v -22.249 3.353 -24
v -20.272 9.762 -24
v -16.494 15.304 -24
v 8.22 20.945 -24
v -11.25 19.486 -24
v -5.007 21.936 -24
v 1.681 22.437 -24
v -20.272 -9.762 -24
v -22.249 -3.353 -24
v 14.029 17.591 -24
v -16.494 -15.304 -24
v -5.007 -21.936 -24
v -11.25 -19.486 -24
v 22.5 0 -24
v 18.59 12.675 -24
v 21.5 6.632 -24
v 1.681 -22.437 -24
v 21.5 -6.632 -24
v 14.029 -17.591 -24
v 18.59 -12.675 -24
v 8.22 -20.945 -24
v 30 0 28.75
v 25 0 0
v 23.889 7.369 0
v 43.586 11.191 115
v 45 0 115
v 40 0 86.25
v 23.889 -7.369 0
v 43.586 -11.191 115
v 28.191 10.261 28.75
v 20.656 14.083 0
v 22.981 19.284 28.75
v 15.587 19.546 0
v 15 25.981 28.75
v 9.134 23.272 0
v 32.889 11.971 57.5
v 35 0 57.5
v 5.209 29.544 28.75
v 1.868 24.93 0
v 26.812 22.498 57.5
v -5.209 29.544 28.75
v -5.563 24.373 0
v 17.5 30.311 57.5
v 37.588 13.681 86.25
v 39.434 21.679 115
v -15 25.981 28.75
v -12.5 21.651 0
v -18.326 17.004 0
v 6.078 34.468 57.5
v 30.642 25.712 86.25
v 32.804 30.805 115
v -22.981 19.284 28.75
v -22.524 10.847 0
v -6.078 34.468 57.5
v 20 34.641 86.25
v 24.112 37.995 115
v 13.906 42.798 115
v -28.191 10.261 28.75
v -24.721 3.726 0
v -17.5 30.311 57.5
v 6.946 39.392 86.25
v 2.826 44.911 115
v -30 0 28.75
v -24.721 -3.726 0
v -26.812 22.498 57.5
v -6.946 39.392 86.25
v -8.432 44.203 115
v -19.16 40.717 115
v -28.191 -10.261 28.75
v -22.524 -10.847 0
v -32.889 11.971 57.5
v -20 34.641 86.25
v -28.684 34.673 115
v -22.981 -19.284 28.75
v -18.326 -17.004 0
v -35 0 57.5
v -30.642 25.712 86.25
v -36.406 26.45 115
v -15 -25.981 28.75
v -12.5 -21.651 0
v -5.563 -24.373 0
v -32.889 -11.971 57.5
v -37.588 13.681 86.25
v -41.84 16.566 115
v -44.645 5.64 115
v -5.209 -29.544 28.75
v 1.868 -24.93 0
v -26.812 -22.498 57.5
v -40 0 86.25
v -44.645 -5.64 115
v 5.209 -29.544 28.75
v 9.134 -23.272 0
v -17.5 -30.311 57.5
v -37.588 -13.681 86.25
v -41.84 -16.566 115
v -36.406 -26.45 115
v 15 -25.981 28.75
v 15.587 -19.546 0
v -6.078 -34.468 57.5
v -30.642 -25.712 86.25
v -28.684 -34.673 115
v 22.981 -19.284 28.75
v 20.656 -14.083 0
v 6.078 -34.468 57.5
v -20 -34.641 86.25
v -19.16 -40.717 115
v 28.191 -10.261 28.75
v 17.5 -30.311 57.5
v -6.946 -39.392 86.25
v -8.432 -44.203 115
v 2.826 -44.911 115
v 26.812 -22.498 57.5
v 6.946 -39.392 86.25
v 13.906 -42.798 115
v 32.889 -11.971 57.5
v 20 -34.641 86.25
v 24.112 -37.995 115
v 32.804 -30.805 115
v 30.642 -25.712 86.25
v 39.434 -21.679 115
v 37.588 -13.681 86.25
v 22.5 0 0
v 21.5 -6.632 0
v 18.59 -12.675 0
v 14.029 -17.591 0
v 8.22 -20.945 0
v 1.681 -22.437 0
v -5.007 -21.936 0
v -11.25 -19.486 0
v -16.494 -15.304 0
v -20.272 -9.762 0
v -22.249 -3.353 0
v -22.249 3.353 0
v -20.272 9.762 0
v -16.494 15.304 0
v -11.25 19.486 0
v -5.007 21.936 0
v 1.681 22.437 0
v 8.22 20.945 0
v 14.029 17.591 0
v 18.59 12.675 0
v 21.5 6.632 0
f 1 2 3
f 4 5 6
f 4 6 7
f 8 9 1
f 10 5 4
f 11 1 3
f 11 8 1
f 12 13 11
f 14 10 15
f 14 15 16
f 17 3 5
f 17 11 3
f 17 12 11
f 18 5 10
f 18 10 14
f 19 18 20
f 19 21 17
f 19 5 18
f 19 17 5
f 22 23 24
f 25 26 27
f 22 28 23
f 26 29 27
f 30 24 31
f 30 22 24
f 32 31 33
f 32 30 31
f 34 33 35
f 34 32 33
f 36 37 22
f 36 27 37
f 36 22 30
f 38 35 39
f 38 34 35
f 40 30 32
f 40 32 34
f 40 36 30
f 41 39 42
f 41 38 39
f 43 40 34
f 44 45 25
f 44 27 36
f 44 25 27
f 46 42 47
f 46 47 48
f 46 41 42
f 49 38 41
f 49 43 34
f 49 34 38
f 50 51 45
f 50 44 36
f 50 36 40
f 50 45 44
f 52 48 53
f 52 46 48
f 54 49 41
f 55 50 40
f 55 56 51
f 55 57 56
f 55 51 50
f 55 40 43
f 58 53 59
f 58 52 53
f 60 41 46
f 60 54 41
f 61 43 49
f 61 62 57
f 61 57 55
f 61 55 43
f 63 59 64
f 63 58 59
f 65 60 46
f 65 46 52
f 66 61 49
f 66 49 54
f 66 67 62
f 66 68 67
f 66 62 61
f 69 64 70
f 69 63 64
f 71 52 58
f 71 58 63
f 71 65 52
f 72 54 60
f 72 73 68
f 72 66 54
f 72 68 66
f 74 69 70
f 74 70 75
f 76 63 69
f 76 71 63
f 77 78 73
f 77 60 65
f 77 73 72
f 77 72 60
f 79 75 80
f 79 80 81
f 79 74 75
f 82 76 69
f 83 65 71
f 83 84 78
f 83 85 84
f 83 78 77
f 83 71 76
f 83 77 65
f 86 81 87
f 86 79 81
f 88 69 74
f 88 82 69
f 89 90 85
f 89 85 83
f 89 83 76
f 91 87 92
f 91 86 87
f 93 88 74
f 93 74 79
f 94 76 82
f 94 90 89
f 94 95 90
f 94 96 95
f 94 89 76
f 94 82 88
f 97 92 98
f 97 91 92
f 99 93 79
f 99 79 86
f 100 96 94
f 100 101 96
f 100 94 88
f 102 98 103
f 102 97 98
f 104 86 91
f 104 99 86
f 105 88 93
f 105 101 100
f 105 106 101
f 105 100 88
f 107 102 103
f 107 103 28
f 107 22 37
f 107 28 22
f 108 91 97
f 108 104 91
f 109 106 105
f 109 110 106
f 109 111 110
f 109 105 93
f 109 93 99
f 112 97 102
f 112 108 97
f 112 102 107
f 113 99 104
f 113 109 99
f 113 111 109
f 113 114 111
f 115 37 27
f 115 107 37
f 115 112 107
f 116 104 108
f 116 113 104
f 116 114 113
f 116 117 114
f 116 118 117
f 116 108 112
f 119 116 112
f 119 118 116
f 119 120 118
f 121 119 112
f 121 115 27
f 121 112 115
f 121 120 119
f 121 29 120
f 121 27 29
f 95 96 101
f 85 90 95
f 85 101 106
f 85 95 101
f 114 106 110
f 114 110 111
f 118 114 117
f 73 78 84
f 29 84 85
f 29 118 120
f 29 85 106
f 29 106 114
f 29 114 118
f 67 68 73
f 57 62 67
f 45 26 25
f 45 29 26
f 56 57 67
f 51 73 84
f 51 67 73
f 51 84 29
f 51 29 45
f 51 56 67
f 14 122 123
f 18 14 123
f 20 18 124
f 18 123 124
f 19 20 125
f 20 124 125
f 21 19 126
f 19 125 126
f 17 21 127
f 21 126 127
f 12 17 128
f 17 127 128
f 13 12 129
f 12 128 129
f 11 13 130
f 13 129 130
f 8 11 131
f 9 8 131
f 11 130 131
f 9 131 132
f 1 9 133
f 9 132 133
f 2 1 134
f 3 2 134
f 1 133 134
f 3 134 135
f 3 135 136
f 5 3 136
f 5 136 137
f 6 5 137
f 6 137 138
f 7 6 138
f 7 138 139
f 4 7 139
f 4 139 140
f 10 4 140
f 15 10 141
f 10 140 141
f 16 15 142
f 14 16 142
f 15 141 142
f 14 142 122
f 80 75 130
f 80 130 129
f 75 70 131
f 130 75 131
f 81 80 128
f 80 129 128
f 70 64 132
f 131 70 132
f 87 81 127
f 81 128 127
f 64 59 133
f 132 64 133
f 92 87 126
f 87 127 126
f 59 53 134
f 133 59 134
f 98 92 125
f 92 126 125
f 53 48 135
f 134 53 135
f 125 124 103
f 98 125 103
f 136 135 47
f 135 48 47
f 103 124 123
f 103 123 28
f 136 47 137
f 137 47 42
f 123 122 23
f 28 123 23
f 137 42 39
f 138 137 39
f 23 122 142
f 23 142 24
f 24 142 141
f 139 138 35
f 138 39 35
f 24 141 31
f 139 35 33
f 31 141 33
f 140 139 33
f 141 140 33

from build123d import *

# Parameters (mm, degrees)
F0_R     = 45
F1_DEPTH = 115
F2_R     = 22.5
F3_DEPTH = 24
F4_SIZE2 = 114.99999
F4_SIZE  = 19.99999


# Not quite as in the source:
# - a fillet or chamfer is up to 0.001 mm smaller than in the source, because OpenCascade refuses the exact size


with BuildPart() as f1:
    # F0 (on Top) → F1 (new body)
    with BuildSketch(Plane.XY):
        Circle(F0_R)
    extrude(amount=F1_DEPTH)

    # F2 (on face) → F3 (join)
    with BuildSketch(Plane(origin=(0, 0, 0), x_dir=(1, 0, 0), z_dir=(0, 0, -1))):
        Circle(F2_R)
    extrude(amount=F3_DEPTH)

    # F4 (size 20 and 115 in the source; OpenCascade refuses exactly that, so slightly less here)
    f4_edges = [f1.edges().sort_by_distance(p)[0] for p in [
        (-45, 0, 0),
    ]]
    f4_side = f1.faces().sort_by_distance((-43.727208, 0, 0))[0]
    chamfer(f4_edges, length=F4_SIZE, length2=F4_SIZE2, reference=f4_side)


solid = f1.part
